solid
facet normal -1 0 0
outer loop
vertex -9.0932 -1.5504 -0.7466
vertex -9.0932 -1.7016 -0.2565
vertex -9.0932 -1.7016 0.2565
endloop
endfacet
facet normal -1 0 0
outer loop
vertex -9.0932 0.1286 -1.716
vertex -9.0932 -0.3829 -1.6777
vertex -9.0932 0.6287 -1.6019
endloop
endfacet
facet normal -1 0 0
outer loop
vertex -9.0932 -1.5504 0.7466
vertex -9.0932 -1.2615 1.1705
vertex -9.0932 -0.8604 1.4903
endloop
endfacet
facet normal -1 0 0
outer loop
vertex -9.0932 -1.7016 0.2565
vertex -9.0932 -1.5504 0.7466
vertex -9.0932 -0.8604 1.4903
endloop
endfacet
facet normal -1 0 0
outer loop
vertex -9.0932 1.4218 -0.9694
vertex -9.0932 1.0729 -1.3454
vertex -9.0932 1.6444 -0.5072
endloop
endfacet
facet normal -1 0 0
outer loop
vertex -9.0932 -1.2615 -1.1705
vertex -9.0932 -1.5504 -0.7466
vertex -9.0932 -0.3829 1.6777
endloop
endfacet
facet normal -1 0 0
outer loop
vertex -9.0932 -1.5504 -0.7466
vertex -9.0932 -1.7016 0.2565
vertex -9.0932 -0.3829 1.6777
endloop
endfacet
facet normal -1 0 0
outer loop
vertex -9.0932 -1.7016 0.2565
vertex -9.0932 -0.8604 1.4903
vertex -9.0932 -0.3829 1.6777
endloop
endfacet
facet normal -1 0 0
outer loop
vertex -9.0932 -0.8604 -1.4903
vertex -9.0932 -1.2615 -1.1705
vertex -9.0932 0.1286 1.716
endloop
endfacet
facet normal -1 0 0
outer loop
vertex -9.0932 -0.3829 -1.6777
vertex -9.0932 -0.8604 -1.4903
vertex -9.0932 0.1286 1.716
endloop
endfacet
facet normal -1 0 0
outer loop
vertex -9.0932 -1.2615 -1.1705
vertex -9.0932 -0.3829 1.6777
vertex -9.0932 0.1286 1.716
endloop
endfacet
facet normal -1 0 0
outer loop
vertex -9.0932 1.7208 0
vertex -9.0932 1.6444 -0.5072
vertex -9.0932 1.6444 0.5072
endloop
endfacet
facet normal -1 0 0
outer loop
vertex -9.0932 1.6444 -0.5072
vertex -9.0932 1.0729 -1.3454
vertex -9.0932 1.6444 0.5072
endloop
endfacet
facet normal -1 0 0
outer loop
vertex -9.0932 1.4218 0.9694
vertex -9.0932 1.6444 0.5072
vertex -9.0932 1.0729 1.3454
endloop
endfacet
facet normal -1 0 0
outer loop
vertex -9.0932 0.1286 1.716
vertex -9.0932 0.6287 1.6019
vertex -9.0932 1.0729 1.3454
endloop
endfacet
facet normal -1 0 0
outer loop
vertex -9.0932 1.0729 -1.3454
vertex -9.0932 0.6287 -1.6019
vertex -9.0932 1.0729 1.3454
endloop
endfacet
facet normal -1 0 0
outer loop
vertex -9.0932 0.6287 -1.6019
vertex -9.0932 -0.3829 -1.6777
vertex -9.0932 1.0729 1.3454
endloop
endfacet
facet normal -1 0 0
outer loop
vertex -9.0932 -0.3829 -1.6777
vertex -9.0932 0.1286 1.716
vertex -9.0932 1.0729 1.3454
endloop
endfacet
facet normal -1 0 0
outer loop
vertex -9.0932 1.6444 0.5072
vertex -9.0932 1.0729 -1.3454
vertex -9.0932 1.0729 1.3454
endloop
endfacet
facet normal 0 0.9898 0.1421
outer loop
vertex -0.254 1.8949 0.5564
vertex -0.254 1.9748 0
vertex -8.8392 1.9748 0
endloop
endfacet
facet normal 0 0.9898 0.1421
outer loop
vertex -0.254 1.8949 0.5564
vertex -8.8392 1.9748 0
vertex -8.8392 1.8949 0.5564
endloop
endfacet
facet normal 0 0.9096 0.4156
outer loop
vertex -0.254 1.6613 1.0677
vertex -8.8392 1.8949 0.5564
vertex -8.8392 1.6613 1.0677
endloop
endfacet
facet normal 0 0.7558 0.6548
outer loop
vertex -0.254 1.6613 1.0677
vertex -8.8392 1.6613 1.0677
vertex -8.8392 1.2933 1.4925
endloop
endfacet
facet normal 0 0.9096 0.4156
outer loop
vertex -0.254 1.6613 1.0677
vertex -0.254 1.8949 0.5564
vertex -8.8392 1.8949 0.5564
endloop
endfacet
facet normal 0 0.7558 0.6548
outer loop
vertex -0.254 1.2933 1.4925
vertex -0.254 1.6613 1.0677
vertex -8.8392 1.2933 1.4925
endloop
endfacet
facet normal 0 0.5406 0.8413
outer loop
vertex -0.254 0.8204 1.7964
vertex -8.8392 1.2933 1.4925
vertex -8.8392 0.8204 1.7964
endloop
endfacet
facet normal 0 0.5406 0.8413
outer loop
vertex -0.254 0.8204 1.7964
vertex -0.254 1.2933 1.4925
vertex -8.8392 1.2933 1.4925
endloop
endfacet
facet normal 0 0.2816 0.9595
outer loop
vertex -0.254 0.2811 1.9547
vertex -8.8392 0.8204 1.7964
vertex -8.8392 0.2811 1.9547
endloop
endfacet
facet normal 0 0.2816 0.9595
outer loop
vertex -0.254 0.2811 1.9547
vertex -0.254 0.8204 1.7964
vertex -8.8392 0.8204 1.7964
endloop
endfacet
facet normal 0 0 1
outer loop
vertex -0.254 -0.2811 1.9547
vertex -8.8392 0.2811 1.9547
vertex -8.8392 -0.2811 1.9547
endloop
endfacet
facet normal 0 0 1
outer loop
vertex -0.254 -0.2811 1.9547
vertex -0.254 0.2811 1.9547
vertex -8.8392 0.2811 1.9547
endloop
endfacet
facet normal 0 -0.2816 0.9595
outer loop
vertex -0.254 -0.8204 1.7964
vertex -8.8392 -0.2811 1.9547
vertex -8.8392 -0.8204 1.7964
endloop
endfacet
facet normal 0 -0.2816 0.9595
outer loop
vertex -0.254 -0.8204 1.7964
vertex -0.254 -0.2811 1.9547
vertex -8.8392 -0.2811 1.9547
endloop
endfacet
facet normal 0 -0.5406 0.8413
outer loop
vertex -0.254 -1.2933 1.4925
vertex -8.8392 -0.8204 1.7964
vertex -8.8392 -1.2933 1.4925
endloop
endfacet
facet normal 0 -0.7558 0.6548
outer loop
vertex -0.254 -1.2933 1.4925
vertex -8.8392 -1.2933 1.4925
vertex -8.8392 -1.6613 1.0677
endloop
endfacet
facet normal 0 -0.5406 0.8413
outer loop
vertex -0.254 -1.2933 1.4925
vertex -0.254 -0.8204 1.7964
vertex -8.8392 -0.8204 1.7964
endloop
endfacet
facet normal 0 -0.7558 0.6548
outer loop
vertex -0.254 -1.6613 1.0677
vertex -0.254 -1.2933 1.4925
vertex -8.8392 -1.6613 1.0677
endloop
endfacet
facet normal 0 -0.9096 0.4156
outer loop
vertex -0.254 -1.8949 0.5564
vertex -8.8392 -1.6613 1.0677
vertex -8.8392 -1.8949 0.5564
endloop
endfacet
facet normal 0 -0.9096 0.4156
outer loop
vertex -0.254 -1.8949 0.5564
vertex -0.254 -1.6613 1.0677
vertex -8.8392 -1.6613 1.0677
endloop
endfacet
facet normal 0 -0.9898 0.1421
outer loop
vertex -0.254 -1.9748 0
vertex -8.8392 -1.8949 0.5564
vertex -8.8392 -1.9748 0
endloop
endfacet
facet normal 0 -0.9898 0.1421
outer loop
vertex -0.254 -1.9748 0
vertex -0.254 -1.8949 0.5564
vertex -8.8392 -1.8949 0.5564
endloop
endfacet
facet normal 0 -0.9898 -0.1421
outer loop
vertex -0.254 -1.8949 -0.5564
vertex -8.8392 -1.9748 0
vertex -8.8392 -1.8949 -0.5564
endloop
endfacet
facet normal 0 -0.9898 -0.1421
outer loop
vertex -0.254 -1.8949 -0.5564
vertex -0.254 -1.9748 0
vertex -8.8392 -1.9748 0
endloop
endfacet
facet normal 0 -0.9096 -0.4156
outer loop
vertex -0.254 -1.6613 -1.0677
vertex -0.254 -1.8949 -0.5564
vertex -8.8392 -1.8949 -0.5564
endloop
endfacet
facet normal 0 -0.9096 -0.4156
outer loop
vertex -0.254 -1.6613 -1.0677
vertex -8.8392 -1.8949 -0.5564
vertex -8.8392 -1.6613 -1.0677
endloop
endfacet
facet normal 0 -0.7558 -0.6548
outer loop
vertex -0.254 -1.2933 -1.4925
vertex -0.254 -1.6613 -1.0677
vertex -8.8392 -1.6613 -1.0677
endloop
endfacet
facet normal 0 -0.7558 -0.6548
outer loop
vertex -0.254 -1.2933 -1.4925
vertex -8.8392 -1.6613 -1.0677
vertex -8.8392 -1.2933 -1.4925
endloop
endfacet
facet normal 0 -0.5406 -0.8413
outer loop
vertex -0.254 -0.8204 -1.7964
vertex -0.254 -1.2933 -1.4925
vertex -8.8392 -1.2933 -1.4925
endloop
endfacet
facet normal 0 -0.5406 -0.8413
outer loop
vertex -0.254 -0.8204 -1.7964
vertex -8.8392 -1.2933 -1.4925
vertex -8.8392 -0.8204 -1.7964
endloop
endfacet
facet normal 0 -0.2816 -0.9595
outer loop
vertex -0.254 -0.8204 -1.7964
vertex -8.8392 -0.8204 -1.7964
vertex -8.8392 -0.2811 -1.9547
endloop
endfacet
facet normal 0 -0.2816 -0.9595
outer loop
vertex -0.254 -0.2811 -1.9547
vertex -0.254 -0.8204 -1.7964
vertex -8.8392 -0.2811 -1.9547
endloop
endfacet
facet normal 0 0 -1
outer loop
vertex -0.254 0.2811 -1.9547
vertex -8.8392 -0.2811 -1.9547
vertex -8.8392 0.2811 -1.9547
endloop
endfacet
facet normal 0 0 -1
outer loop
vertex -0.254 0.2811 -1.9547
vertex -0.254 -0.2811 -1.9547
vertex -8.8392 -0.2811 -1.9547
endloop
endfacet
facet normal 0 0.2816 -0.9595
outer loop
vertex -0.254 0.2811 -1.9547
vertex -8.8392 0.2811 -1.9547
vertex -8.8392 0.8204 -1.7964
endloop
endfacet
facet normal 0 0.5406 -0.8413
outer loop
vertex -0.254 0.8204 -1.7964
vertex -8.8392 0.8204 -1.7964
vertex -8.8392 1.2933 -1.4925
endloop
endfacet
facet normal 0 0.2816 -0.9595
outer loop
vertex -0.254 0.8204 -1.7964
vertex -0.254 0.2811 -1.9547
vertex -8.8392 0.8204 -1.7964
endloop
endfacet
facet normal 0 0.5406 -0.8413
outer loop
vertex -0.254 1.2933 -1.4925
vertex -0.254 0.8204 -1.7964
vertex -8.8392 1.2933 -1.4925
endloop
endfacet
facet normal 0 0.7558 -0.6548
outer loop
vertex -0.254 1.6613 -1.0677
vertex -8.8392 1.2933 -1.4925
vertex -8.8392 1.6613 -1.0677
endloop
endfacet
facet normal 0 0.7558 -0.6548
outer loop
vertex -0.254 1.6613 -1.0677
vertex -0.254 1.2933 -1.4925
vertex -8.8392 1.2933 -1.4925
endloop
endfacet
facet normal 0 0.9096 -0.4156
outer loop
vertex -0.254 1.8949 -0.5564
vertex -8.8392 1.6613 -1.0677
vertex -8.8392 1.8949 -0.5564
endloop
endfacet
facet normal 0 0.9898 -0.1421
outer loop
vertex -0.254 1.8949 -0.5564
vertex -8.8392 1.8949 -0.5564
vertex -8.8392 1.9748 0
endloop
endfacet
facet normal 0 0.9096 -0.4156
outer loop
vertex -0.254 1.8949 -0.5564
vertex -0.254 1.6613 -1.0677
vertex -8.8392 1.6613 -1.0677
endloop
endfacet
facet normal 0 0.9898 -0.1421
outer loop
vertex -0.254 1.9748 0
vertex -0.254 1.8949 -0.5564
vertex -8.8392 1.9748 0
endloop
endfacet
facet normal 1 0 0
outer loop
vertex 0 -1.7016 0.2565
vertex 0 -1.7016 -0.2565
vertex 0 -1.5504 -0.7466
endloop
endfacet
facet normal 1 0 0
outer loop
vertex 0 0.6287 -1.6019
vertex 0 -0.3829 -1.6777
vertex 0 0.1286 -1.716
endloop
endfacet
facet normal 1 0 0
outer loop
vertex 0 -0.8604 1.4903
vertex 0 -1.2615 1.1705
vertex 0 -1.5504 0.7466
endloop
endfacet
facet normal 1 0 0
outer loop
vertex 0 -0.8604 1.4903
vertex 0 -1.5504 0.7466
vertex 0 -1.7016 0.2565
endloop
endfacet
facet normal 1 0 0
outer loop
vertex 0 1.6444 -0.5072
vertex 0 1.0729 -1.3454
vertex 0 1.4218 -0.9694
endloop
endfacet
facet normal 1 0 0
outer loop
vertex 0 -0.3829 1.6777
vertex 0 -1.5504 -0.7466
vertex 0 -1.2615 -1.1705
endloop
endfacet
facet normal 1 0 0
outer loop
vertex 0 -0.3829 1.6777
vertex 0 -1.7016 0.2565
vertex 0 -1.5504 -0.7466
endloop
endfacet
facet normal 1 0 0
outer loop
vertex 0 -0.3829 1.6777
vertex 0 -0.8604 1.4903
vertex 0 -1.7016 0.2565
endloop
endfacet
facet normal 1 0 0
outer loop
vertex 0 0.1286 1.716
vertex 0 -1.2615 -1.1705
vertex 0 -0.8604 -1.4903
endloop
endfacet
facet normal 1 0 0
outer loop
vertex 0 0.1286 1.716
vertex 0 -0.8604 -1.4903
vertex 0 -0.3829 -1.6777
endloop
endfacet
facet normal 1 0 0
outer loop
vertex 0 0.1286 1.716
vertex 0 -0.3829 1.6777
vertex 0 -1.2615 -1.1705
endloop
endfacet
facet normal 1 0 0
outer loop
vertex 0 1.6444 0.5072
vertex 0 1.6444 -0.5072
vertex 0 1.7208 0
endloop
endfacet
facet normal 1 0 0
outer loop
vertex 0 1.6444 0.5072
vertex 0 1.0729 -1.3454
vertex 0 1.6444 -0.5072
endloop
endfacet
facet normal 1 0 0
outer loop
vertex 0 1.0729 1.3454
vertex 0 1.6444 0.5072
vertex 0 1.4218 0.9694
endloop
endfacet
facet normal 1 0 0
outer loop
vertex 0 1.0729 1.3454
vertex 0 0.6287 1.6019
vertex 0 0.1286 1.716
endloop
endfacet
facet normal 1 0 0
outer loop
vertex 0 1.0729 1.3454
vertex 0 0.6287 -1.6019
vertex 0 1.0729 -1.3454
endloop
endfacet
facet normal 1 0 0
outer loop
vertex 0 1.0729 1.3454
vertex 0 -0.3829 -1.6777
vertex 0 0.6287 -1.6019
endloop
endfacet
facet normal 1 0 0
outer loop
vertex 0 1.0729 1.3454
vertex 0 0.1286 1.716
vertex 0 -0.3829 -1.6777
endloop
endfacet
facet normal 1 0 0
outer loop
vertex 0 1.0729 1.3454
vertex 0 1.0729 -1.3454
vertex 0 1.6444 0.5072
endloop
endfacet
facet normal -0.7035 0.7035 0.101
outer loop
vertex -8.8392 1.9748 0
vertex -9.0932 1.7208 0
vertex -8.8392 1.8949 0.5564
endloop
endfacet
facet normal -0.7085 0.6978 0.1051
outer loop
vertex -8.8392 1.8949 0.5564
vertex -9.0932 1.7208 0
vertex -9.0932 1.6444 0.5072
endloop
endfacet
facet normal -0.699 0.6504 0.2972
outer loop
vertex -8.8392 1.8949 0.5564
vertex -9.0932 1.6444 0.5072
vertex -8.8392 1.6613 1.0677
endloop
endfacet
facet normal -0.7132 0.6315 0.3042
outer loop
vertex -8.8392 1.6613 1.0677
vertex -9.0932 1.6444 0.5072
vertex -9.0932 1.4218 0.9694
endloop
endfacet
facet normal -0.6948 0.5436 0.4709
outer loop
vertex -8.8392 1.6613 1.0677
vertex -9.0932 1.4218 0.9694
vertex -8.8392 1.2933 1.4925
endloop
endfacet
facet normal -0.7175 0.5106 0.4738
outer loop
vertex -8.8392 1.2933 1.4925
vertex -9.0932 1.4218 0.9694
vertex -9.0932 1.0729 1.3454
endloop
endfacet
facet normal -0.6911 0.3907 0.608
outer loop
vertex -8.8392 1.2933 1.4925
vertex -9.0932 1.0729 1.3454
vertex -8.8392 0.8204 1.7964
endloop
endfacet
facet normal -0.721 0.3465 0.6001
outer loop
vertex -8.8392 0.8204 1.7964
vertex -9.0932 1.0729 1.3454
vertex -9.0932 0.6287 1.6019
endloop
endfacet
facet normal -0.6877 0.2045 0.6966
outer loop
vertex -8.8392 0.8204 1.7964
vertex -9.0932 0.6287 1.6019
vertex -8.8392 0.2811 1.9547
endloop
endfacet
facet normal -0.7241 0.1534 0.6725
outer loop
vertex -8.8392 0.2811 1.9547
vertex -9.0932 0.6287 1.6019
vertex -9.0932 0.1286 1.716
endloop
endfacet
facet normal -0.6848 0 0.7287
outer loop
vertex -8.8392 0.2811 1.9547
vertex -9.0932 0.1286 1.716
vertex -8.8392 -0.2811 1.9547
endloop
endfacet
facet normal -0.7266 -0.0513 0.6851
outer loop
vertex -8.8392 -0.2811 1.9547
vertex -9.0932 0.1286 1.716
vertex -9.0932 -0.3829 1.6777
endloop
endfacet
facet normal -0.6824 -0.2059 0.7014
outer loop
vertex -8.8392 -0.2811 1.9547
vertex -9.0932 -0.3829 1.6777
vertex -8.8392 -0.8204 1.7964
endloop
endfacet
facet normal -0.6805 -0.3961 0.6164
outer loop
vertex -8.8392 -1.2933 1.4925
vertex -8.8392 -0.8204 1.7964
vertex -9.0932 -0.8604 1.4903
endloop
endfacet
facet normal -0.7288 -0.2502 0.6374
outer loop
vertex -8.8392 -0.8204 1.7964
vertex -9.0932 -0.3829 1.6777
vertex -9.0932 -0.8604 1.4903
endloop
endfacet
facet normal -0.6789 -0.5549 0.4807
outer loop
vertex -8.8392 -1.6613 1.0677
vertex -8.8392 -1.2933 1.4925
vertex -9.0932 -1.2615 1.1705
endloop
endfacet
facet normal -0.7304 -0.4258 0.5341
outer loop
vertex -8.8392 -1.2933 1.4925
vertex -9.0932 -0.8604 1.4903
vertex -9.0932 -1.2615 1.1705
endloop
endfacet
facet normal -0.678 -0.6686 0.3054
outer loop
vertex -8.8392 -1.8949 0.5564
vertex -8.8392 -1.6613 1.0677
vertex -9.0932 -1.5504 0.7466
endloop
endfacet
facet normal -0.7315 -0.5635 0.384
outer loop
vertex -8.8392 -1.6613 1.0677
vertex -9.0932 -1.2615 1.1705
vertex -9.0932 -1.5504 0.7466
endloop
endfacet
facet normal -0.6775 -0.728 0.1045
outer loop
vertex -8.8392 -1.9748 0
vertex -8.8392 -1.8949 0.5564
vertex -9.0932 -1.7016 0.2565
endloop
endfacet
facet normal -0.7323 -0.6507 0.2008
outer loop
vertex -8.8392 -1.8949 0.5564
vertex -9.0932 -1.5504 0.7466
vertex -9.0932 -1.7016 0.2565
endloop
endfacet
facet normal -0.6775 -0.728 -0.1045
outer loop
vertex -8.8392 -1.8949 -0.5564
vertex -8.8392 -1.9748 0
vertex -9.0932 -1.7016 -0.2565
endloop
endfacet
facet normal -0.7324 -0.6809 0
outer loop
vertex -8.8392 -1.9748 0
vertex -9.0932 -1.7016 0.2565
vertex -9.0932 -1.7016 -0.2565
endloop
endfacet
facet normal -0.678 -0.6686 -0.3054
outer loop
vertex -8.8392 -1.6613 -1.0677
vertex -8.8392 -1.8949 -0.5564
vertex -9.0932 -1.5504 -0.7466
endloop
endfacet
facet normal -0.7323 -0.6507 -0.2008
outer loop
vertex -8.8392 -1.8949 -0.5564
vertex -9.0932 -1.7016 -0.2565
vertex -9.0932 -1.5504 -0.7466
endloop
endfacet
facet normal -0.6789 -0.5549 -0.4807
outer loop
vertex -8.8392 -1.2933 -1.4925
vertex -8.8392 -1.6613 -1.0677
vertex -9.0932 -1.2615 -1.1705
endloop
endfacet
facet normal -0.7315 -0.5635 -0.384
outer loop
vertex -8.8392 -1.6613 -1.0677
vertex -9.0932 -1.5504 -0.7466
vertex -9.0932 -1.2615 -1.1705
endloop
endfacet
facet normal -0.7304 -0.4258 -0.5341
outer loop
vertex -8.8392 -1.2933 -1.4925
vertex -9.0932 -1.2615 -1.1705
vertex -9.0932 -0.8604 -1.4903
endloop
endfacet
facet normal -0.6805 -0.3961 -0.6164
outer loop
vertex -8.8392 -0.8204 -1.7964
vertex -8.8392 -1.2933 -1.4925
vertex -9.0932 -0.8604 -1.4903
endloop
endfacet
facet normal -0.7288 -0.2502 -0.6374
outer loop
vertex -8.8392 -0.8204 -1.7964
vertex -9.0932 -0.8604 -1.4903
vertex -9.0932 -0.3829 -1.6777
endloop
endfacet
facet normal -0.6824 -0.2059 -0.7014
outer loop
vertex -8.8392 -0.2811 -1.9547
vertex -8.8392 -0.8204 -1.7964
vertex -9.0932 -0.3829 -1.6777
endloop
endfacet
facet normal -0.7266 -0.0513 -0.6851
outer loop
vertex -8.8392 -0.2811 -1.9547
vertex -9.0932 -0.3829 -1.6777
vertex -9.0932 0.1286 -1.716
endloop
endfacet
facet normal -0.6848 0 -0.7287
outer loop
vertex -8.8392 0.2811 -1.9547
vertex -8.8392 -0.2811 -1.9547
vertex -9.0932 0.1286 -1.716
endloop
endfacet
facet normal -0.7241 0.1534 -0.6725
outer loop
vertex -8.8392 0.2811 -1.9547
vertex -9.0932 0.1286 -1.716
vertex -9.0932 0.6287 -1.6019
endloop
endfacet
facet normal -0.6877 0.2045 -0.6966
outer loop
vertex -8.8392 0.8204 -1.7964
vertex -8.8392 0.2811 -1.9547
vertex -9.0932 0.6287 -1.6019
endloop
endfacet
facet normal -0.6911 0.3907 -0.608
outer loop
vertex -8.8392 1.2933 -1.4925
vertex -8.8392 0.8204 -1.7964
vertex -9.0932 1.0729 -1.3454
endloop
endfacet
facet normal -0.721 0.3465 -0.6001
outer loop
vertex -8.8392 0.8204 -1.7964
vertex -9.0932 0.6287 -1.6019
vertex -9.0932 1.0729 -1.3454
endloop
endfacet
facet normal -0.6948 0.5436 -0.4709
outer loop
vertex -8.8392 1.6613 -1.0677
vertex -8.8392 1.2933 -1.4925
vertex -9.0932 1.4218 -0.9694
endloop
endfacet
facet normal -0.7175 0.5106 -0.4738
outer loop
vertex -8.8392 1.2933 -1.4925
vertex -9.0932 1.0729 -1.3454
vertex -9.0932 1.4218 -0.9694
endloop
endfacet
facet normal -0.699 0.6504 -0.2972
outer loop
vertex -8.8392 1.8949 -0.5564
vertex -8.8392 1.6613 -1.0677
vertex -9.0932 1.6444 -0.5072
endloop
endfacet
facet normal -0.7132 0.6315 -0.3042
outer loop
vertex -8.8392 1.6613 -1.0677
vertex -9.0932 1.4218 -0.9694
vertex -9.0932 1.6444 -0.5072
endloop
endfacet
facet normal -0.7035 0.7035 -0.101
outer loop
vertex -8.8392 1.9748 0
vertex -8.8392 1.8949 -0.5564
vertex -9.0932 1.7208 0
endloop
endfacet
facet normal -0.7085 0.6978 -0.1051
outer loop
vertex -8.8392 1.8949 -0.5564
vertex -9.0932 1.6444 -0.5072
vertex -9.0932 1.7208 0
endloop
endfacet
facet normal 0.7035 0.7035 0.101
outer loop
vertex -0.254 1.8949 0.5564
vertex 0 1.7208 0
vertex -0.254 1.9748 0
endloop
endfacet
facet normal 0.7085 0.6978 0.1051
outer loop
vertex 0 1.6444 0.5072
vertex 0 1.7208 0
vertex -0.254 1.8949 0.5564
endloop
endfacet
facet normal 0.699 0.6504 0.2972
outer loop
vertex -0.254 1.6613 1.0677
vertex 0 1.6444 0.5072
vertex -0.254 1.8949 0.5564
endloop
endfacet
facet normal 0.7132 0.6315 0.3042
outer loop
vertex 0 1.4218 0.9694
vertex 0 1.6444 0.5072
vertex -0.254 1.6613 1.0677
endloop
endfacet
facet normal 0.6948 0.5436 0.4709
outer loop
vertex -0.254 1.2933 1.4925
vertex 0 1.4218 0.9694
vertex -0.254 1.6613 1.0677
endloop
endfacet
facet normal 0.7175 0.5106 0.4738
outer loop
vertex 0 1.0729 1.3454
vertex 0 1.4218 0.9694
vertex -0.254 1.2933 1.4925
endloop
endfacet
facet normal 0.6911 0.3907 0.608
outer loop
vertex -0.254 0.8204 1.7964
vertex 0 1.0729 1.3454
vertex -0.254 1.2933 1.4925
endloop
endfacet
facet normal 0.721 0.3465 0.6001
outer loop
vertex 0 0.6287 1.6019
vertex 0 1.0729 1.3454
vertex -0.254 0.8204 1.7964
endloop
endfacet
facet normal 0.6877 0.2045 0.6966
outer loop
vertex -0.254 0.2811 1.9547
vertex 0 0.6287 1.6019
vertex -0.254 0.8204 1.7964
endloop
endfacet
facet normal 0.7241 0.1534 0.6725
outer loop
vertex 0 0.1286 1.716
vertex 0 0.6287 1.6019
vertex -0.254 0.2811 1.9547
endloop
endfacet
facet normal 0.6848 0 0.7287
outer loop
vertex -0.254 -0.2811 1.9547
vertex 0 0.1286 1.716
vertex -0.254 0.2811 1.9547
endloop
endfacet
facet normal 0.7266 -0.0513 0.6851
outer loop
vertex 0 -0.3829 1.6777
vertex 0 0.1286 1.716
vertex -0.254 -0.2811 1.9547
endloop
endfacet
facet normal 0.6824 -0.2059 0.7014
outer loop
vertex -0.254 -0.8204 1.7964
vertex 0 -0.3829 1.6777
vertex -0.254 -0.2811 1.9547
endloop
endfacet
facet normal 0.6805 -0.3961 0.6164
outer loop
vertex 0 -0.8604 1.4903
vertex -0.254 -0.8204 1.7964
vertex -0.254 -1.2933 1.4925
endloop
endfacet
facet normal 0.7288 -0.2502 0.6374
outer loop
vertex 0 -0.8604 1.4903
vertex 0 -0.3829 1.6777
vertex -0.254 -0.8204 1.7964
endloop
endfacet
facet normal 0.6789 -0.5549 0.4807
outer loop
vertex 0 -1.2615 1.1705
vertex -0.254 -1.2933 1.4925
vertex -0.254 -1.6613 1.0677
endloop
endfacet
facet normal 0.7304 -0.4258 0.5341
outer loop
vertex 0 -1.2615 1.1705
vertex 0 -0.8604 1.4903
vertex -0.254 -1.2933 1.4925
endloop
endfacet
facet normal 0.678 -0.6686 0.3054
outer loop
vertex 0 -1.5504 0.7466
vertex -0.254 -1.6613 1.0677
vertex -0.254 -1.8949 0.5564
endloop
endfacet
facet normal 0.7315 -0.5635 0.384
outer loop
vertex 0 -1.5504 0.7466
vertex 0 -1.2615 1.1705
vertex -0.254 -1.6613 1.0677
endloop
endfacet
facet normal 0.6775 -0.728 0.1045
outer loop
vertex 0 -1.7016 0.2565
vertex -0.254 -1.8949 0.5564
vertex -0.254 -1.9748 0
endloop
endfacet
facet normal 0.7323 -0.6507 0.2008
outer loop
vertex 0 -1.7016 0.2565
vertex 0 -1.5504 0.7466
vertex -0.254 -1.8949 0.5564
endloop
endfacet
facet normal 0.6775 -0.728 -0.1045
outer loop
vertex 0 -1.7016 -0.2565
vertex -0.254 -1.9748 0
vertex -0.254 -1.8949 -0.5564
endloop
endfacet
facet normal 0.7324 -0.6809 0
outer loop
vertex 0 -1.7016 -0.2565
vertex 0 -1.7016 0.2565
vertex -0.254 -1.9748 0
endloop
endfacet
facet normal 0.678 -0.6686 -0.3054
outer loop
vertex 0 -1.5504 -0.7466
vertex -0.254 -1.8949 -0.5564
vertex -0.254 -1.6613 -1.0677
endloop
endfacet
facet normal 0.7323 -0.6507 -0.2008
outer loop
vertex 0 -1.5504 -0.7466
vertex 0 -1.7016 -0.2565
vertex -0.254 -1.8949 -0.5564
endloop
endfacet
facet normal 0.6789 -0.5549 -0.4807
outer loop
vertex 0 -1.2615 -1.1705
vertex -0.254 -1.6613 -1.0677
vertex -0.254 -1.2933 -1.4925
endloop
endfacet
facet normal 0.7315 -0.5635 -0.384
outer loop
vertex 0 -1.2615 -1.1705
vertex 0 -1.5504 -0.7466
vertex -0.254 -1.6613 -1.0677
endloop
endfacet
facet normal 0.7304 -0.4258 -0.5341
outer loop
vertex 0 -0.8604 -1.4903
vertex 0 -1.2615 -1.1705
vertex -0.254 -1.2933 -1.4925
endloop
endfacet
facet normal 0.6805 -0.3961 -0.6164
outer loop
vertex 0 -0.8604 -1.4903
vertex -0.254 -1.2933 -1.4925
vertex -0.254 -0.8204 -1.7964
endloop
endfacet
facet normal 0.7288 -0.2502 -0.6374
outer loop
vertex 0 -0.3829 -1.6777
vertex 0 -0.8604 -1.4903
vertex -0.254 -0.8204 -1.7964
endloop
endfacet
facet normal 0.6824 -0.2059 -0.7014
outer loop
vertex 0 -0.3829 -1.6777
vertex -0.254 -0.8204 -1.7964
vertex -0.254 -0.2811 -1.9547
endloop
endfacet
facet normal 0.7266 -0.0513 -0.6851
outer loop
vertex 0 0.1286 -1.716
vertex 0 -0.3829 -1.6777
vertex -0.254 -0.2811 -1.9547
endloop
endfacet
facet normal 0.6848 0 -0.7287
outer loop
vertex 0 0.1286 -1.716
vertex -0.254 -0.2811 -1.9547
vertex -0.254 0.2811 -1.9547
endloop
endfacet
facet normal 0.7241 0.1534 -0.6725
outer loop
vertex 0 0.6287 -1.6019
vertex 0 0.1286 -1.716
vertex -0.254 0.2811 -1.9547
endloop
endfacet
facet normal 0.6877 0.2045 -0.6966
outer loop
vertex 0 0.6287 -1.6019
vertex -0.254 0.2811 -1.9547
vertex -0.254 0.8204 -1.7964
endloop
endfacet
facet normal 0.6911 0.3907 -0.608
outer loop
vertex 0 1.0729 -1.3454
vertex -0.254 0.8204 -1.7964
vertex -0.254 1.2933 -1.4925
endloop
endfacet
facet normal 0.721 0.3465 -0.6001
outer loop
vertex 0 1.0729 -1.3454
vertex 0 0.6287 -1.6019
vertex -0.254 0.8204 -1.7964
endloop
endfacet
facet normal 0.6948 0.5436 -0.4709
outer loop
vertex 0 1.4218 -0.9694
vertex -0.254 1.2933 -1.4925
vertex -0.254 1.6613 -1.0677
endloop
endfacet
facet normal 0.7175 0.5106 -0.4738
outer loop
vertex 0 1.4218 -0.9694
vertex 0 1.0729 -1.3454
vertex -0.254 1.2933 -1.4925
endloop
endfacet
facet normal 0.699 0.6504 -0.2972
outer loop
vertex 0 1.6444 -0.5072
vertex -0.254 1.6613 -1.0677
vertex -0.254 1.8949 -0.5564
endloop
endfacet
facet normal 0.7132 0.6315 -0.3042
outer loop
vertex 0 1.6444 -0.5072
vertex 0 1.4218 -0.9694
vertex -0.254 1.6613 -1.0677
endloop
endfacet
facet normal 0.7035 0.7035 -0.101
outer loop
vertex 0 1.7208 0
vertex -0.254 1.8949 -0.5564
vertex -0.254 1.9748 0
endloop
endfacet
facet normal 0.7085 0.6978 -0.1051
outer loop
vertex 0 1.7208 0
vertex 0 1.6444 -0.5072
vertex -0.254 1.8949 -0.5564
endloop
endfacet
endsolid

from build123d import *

# Parameters (mm, degrees)
F0_R     = 1.97485
F1_DEPTH = 9.0932
F2_SIZE2 = 0.254
F2_SIZE  = 0.254
F3_SIZE2 = 0.254
F3_SIZE  = 0.254


with BuildPart() as f1:
    # F0 (on Right) → F1 (new body)
    with BuildSketch(Plane.YZ):
        Circle(F0_R)
    extrude(amount=-F1_DEPTH)

    # F2
    f2_edges = [f1.edges().sort_by_distance(p)[0] for p in [
        (0, -1.97485, 0),
    ]]
    chamfer(f2_edges, length=F2_SIZE, length2=F2_SIZE2)

    # F3
    f3_edges = [f1.edges().sort_by_distance(p)[0] for p in [
        (-9.0932, -1.97485, 0),
    ]]
    chamfer(f3_edges, length=F3_SIZE, length2=F3_SIZE2)


solid = f1.part
